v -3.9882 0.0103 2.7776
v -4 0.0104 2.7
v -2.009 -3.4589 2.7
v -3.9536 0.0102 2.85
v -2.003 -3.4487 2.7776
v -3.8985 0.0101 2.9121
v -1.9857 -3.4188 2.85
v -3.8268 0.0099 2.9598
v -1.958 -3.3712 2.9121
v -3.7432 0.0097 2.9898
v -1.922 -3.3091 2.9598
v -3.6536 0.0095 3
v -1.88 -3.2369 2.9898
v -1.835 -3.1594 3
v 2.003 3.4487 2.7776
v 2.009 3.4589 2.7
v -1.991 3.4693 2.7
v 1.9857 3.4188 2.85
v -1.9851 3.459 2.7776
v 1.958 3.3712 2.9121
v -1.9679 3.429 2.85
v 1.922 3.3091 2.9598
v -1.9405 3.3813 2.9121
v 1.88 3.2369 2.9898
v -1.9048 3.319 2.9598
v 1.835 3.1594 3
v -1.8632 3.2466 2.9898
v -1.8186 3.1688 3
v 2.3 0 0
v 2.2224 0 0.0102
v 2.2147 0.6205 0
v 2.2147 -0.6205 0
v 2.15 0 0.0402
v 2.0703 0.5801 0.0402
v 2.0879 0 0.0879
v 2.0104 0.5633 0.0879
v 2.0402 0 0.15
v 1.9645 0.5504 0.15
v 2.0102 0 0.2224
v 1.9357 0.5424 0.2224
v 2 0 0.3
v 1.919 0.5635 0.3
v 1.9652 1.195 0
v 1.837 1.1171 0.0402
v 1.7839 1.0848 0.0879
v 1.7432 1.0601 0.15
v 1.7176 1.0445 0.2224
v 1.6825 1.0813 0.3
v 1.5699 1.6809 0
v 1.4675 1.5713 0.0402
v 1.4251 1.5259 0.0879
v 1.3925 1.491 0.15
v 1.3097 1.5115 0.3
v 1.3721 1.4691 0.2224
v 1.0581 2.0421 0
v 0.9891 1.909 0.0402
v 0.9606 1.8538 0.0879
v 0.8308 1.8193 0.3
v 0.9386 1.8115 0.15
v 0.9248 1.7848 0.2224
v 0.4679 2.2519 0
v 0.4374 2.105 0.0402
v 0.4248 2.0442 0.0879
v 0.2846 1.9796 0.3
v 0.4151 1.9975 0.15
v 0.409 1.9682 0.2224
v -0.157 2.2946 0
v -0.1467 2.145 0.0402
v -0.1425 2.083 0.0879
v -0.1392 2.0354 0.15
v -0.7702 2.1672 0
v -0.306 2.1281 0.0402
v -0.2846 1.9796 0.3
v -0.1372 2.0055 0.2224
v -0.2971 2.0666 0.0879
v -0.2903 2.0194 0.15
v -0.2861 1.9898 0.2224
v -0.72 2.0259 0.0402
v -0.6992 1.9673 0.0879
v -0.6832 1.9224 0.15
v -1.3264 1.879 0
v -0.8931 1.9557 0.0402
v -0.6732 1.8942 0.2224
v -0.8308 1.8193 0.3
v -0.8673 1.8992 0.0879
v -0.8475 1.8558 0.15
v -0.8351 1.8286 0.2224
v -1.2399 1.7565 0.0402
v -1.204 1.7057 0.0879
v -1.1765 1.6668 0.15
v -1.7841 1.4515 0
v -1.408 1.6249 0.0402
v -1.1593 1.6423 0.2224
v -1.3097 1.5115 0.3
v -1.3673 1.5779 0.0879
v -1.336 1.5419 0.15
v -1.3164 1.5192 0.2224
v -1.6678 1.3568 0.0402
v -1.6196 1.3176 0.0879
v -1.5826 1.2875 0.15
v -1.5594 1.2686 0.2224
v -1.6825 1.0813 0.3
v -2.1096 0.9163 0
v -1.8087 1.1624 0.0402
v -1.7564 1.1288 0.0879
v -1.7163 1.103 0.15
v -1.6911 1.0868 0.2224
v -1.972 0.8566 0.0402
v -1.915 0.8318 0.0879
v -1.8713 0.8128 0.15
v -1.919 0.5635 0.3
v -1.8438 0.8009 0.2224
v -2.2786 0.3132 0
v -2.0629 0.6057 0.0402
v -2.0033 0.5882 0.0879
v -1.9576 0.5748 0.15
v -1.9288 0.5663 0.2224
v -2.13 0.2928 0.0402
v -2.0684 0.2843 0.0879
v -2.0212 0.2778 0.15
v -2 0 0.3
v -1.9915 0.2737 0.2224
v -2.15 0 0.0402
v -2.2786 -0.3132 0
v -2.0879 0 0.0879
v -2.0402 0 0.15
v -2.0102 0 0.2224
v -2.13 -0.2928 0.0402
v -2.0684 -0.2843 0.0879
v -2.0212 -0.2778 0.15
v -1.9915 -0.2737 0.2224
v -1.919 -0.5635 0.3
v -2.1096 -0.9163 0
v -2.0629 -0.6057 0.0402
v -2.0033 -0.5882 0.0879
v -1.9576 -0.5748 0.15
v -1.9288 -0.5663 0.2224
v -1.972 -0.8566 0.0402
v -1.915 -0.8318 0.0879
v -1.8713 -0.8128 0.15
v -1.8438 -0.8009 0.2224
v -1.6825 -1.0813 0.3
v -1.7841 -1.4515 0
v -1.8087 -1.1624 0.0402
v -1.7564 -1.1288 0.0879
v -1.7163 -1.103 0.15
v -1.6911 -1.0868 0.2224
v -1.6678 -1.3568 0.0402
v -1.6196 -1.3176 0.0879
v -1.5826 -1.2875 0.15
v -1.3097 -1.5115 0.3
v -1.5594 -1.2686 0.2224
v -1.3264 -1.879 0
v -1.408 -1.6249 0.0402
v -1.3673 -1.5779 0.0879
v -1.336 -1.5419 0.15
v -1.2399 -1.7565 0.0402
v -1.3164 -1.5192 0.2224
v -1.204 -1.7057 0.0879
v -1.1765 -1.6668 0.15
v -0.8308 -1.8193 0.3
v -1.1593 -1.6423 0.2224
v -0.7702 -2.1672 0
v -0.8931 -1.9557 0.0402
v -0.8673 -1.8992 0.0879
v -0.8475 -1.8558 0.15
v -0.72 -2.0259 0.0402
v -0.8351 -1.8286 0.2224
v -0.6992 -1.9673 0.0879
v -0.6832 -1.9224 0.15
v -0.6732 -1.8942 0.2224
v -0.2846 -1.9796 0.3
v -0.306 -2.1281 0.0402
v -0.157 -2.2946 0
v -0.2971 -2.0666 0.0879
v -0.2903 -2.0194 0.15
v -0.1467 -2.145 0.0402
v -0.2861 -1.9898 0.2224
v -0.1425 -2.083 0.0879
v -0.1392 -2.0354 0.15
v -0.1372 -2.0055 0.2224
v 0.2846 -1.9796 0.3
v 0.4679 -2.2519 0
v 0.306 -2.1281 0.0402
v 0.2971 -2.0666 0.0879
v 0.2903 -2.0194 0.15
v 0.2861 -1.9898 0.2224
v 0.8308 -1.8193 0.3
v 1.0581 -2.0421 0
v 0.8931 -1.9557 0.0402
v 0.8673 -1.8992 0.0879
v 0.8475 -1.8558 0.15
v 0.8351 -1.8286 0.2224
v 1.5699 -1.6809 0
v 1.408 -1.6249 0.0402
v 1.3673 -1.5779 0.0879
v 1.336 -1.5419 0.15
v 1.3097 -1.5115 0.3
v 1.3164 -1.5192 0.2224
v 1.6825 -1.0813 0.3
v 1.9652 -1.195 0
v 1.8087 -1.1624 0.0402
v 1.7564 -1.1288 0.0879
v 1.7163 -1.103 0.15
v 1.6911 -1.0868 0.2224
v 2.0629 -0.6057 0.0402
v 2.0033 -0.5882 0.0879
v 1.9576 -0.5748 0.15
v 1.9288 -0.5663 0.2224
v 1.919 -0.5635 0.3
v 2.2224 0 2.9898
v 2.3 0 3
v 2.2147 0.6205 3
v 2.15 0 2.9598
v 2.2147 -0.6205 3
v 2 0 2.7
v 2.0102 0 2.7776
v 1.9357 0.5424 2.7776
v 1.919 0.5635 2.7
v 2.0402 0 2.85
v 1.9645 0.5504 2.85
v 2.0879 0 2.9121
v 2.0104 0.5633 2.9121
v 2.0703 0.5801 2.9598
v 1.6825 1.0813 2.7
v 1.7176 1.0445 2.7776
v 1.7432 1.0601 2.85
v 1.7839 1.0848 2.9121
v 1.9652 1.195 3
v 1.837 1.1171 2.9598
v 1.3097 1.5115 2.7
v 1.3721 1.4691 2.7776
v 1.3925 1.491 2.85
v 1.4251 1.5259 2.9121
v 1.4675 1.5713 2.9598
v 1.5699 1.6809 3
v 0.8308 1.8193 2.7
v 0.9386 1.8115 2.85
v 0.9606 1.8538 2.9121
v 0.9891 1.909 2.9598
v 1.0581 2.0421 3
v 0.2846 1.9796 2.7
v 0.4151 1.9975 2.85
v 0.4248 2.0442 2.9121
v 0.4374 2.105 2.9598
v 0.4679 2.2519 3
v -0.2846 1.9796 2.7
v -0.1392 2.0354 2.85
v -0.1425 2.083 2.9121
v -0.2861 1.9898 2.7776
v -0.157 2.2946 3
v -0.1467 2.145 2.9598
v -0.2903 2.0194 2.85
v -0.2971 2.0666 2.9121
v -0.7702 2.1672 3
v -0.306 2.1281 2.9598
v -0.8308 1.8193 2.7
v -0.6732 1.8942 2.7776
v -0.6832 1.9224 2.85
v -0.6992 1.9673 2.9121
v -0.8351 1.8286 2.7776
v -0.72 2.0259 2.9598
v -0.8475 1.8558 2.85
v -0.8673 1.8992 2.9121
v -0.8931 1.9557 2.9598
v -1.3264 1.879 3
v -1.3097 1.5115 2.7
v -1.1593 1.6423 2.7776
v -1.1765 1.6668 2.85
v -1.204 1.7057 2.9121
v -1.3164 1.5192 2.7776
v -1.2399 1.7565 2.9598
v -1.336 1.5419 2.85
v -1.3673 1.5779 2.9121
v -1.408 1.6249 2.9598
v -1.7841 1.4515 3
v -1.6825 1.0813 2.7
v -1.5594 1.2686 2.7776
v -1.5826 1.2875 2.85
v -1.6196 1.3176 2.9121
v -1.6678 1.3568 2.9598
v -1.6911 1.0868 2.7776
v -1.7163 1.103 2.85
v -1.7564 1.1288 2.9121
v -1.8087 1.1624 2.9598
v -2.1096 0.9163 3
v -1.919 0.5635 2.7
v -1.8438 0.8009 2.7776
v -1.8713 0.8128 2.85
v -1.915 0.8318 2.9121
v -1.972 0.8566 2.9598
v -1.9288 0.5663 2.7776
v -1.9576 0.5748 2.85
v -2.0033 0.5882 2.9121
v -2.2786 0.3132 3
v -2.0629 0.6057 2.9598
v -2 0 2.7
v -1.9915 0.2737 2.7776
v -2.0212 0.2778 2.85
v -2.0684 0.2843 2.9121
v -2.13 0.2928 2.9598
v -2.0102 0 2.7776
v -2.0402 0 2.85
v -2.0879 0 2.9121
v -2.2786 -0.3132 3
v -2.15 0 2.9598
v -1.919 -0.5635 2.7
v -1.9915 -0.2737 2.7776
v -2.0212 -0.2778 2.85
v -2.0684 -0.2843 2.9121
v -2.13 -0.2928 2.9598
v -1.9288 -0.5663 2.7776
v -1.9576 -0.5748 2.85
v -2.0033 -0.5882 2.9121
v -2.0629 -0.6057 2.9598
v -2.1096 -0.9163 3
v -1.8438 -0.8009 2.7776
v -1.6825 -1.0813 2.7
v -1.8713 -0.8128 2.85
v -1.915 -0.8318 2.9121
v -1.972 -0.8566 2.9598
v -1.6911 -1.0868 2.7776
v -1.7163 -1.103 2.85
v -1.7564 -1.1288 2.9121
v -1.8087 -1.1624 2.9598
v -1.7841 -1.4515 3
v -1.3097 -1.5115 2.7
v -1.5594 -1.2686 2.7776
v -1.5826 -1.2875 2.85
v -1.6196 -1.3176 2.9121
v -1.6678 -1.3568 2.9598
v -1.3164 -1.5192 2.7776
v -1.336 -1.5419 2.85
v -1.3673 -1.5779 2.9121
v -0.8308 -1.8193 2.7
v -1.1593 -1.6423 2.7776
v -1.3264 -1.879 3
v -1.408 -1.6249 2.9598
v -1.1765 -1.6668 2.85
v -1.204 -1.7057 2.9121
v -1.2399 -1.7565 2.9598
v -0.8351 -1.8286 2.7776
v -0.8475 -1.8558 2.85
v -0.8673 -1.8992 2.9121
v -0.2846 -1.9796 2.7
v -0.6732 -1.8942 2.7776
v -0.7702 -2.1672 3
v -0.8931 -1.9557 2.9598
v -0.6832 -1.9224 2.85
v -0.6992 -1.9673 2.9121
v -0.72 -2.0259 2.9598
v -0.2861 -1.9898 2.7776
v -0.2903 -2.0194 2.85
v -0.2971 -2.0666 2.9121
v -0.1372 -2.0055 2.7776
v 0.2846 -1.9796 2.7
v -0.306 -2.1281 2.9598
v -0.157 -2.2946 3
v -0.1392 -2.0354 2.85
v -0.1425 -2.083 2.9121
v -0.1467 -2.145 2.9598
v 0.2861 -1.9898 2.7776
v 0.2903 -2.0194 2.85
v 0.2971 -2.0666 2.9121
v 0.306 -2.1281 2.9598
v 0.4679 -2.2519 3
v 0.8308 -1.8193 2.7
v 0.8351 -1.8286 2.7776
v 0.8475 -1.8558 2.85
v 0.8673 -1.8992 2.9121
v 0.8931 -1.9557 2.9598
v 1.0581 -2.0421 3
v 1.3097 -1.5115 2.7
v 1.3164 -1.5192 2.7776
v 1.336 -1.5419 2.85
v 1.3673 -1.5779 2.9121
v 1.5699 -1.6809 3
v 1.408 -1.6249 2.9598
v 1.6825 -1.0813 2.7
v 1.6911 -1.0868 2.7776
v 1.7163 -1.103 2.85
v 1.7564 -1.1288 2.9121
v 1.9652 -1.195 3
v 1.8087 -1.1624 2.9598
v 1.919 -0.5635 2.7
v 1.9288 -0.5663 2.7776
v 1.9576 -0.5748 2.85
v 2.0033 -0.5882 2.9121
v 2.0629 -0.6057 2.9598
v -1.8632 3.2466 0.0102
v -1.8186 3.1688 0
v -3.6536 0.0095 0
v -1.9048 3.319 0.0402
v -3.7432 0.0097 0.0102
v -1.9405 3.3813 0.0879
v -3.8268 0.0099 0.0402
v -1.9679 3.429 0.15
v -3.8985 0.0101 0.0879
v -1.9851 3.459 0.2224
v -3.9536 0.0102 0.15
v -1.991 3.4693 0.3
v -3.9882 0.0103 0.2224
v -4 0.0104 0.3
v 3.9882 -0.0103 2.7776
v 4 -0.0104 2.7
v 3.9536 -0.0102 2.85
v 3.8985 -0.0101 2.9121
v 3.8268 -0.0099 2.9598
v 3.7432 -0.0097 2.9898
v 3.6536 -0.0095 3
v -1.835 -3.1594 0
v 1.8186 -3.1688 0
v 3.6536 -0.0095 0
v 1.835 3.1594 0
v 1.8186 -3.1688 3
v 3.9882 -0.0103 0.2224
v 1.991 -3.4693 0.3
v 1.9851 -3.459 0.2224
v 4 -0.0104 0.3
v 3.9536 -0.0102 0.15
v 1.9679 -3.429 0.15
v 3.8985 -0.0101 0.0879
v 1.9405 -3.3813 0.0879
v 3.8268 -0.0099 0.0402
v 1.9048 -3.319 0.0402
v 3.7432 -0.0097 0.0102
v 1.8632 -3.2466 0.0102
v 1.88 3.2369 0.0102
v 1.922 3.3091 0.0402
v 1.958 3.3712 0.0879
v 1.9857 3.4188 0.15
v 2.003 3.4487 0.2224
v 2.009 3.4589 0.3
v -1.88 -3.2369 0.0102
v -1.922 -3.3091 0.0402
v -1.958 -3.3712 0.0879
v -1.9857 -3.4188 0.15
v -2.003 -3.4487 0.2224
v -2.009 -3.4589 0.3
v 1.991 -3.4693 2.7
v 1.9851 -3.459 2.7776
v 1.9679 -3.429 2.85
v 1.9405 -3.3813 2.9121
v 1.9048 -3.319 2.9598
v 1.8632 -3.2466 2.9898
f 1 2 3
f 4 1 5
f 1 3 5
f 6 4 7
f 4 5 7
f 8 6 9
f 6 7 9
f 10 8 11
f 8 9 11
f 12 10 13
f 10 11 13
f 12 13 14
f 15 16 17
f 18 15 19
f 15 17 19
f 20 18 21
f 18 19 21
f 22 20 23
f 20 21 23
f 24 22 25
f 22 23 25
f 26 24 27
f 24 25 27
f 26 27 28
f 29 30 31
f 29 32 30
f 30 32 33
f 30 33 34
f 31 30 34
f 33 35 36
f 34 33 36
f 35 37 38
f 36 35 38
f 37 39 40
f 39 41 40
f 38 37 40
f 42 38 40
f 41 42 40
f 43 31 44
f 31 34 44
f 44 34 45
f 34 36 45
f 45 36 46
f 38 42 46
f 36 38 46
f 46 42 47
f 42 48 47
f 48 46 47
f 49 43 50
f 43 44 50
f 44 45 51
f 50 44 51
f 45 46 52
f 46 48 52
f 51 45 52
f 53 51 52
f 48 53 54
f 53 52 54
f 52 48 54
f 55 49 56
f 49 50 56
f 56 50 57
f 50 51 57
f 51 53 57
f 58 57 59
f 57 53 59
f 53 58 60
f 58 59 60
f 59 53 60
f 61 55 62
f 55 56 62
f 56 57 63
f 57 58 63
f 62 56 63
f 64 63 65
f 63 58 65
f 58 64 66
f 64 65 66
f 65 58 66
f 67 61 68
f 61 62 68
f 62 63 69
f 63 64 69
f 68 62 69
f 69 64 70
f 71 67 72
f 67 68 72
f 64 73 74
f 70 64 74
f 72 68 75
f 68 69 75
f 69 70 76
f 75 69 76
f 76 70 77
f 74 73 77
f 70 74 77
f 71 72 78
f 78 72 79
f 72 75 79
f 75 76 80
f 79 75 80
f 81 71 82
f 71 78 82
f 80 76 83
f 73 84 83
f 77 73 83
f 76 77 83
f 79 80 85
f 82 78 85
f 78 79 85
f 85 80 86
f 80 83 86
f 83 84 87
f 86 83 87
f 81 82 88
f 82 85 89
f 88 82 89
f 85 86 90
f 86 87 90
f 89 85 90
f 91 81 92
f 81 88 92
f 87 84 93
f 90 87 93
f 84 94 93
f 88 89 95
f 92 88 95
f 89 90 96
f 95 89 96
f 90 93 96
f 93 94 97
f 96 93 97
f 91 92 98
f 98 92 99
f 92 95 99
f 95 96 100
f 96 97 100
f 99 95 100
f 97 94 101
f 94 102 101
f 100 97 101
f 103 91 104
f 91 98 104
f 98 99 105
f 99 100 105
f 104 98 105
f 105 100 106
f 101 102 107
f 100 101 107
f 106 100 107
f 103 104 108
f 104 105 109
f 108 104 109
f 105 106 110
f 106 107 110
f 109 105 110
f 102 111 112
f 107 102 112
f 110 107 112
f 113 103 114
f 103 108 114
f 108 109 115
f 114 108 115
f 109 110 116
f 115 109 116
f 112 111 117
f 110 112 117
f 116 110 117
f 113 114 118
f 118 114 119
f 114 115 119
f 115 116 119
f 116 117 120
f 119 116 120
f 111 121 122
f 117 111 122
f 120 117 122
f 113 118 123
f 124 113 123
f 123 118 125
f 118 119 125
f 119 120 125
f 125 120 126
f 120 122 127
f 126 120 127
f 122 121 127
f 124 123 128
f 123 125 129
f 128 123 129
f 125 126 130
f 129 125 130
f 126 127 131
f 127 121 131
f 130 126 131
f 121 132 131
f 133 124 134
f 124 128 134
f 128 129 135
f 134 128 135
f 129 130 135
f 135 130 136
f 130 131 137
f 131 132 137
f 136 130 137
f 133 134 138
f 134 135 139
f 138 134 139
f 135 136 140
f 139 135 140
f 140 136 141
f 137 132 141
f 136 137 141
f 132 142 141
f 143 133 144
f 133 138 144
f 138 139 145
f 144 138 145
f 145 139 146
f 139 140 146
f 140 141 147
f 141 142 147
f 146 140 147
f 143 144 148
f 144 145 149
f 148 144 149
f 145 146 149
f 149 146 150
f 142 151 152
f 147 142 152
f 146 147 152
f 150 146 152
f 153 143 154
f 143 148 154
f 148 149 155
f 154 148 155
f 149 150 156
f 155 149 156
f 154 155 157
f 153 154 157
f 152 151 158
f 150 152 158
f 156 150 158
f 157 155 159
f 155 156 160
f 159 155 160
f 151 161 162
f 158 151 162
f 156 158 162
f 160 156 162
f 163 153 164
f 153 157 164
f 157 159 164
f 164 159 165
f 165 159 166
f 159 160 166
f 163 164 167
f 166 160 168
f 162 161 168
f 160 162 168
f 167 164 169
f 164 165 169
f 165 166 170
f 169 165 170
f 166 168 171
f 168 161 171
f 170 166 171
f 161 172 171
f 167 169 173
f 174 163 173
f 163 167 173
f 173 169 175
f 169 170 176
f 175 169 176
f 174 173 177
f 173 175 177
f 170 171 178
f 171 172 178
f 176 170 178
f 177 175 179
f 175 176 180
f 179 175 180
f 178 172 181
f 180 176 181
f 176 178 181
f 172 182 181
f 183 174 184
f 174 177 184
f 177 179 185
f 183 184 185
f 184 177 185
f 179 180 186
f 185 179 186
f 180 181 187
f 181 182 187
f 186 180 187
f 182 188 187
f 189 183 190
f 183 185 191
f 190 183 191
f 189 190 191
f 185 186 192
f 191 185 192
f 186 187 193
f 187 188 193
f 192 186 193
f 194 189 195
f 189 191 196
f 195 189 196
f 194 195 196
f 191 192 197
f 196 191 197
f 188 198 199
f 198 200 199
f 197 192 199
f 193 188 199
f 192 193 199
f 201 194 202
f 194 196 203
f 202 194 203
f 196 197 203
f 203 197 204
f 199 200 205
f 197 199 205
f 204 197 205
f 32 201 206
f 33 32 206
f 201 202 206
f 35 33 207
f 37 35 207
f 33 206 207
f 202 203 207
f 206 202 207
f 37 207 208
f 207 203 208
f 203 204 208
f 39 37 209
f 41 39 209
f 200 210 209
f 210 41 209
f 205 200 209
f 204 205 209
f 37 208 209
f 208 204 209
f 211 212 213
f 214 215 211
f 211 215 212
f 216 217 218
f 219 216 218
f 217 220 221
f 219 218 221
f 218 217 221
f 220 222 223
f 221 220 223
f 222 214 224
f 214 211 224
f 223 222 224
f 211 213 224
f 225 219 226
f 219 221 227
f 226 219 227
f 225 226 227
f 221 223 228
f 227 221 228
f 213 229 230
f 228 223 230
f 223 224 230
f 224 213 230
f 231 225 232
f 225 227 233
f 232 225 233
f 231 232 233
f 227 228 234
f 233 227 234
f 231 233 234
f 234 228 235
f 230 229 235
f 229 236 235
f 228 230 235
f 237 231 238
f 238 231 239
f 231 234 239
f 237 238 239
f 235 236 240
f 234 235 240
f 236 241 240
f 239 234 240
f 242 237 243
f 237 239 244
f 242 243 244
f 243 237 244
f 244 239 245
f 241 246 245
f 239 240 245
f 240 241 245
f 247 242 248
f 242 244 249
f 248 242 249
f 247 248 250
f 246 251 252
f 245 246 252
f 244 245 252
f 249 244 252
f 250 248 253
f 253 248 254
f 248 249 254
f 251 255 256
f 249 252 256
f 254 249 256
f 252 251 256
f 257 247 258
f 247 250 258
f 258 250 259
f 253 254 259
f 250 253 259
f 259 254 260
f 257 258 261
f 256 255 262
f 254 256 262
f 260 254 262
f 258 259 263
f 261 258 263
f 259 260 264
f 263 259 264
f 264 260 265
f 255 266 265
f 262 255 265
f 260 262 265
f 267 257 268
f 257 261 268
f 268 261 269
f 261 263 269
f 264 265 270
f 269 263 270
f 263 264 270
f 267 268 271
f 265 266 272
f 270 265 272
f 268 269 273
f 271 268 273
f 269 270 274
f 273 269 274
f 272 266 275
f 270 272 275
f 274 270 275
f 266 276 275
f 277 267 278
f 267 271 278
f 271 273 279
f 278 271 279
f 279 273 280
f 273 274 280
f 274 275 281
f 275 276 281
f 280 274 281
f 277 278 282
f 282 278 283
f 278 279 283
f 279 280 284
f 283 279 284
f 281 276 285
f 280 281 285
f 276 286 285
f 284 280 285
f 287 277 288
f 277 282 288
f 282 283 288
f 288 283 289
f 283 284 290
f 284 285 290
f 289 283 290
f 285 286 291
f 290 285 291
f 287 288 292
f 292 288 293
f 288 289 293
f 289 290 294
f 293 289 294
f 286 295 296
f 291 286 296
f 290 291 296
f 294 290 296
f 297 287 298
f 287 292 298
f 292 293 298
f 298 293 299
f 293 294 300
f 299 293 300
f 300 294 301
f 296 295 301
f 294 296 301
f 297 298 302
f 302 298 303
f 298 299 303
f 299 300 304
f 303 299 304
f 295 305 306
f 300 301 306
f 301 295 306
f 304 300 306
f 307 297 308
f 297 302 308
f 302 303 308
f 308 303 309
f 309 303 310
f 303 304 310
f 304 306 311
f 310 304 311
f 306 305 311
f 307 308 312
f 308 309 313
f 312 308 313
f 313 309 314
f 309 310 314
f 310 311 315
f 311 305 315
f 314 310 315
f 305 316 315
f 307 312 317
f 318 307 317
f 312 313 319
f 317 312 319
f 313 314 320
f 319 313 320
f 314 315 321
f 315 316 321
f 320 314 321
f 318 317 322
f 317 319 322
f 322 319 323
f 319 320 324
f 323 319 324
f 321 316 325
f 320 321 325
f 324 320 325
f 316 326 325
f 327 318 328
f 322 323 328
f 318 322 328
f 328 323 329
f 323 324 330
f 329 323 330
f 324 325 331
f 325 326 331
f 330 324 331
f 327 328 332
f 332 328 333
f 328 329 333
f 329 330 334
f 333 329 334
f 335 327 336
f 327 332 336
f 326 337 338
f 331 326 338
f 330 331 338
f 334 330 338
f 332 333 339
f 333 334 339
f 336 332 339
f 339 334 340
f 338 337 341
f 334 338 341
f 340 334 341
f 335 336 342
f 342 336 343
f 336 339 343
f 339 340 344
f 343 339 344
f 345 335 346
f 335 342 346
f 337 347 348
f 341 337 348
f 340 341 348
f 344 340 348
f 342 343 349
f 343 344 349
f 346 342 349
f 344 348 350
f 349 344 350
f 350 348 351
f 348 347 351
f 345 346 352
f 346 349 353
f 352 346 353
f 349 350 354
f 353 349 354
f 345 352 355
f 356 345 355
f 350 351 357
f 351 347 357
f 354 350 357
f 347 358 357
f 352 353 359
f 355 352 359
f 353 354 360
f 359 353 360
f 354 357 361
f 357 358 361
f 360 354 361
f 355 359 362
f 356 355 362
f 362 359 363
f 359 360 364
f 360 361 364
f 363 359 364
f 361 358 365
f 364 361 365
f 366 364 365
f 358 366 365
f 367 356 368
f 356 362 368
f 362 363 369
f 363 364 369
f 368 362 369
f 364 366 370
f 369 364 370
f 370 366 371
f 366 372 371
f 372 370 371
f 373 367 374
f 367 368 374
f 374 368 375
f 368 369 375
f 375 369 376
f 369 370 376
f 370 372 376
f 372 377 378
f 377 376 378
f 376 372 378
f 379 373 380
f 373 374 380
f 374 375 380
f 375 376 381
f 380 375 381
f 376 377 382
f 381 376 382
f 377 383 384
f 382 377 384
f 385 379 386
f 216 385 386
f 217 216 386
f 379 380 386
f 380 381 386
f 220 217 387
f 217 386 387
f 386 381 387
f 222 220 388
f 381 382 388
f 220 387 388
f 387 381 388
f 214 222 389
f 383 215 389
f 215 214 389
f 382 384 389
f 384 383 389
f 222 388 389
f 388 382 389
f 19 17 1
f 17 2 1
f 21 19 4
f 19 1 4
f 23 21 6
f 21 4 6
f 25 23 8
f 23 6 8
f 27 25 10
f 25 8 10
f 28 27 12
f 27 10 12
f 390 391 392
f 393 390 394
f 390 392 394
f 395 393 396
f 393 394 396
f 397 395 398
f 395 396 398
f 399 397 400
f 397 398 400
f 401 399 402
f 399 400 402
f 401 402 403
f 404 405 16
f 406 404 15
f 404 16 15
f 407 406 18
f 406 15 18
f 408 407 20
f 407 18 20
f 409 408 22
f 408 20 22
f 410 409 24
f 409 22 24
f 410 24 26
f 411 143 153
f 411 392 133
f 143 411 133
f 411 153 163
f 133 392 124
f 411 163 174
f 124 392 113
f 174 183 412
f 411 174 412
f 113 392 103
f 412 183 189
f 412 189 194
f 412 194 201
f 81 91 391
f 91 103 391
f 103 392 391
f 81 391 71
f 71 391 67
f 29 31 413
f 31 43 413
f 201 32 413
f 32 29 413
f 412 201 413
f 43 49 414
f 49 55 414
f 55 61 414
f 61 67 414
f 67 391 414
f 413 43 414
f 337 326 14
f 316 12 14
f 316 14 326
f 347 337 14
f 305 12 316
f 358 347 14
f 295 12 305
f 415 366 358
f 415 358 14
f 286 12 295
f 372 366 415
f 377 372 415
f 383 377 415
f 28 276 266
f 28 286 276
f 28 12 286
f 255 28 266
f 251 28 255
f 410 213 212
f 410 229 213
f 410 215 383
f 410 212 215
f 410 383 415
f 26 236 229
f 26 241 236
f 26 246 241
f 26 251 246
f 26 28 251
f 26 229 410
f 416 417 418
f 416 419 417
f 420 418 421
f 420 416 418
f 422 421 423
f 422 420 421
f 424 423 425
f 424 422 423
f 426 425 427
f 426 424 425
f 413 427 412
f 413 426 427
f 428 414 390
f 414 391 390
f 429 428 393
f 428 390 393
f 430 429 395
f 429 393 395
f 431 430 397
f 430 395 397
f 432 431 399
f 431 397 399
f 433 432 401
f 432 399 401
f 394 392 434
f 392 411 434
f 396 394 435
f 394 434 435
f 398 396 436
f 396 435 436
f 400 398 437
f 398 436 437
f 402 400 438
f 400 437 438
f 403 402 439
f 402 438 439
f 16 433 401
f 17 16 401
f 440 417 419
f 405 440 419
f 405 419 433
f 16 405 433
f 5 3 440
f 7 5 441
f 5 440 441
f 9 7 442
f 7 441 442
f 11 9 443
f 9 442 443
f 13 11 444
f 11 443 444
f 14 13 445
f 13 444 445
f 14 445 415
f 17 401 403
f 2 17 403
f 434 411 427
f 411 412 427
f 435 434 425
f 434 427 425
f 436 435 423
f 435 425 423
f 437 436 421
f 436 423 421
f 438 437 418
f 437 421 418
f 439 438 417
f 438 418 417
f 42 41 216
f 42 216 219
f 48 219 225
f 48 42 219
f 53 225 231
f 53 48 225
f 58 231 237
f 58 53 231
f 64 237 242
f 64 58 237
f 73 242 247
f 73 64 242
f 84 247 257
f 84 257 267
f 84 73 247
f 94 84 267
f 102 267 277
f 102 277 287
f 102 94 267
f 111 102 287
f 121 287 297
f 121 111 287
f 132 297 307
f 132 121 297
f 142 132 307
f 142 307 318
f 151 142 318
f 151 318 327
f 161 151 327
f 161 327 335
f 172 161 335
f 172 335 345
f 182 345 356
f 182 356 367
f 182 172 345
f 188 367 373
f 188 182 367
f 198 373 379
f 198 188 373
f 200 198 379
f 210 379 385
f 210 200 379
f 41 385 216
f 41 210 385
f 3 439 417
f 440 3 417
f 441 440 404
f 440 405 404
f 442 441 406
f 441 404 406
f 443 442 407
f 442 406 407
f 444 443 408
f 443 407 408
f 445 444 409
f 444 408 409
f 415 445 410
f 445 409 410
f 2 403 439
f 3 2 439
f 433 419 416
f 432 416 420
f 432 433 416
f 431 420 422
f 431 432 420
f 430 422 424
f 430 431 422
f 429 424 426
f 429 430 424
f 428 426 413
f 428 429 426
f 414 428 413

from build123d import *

# Parameters (mm, degrees)
F0_R     = 2
F1_DEPTH = 3
F2_R     = 0.3
F3_R     = 0.3


with BuildPart() as f1:
    # F0 (on Top) → F1 (new body)
    with BuildSketch(Plane.XY):
        Polygon((3.999987, -0.010358), (2.008964, 3.458911), (-1.991023, 3.469269), (-3.999987, 0.010358), (-2.008964, -3.458911), (1.991023, -3.469269), align=None)
        Circle(F0_R, mode=Mode.SUBTRACT)
    extrude(amount=F1_DEPTH)

    # F2
    f2_edges = [f1.edges().sort_by_distance(p)[0] for p in [
        (3.004475, 1.724276, 3),
        (0.00897, 3.46409, 3),
        (-2.995505, 1.739814, 3),
        (-3.004475, -1.724276, 3),
        (-0.00897, -3.46409, 3),
        (2.995505, -1.739814, 3),
        (-2, 0, 3),
    ]]
    fillet(f2_edges, radius=F2_R)

    # F3
    f3_edges = [f1.edges().sort_by_distance(p)[0] for p in [
        (3.004475, 1.724276, 0),
        (0.00897, 3.46409, 0),
        (-2.995505, 1.739814, 0),
        (-3.004475, -1.724276, 0),
        (-0.00897, -3.46409, 0),
        (2.995505, -1.739814, 0),
        (-2, 0, 0),
    ]]
    fillet(f3_edges, radius=F3_R)


solid = f1.part
